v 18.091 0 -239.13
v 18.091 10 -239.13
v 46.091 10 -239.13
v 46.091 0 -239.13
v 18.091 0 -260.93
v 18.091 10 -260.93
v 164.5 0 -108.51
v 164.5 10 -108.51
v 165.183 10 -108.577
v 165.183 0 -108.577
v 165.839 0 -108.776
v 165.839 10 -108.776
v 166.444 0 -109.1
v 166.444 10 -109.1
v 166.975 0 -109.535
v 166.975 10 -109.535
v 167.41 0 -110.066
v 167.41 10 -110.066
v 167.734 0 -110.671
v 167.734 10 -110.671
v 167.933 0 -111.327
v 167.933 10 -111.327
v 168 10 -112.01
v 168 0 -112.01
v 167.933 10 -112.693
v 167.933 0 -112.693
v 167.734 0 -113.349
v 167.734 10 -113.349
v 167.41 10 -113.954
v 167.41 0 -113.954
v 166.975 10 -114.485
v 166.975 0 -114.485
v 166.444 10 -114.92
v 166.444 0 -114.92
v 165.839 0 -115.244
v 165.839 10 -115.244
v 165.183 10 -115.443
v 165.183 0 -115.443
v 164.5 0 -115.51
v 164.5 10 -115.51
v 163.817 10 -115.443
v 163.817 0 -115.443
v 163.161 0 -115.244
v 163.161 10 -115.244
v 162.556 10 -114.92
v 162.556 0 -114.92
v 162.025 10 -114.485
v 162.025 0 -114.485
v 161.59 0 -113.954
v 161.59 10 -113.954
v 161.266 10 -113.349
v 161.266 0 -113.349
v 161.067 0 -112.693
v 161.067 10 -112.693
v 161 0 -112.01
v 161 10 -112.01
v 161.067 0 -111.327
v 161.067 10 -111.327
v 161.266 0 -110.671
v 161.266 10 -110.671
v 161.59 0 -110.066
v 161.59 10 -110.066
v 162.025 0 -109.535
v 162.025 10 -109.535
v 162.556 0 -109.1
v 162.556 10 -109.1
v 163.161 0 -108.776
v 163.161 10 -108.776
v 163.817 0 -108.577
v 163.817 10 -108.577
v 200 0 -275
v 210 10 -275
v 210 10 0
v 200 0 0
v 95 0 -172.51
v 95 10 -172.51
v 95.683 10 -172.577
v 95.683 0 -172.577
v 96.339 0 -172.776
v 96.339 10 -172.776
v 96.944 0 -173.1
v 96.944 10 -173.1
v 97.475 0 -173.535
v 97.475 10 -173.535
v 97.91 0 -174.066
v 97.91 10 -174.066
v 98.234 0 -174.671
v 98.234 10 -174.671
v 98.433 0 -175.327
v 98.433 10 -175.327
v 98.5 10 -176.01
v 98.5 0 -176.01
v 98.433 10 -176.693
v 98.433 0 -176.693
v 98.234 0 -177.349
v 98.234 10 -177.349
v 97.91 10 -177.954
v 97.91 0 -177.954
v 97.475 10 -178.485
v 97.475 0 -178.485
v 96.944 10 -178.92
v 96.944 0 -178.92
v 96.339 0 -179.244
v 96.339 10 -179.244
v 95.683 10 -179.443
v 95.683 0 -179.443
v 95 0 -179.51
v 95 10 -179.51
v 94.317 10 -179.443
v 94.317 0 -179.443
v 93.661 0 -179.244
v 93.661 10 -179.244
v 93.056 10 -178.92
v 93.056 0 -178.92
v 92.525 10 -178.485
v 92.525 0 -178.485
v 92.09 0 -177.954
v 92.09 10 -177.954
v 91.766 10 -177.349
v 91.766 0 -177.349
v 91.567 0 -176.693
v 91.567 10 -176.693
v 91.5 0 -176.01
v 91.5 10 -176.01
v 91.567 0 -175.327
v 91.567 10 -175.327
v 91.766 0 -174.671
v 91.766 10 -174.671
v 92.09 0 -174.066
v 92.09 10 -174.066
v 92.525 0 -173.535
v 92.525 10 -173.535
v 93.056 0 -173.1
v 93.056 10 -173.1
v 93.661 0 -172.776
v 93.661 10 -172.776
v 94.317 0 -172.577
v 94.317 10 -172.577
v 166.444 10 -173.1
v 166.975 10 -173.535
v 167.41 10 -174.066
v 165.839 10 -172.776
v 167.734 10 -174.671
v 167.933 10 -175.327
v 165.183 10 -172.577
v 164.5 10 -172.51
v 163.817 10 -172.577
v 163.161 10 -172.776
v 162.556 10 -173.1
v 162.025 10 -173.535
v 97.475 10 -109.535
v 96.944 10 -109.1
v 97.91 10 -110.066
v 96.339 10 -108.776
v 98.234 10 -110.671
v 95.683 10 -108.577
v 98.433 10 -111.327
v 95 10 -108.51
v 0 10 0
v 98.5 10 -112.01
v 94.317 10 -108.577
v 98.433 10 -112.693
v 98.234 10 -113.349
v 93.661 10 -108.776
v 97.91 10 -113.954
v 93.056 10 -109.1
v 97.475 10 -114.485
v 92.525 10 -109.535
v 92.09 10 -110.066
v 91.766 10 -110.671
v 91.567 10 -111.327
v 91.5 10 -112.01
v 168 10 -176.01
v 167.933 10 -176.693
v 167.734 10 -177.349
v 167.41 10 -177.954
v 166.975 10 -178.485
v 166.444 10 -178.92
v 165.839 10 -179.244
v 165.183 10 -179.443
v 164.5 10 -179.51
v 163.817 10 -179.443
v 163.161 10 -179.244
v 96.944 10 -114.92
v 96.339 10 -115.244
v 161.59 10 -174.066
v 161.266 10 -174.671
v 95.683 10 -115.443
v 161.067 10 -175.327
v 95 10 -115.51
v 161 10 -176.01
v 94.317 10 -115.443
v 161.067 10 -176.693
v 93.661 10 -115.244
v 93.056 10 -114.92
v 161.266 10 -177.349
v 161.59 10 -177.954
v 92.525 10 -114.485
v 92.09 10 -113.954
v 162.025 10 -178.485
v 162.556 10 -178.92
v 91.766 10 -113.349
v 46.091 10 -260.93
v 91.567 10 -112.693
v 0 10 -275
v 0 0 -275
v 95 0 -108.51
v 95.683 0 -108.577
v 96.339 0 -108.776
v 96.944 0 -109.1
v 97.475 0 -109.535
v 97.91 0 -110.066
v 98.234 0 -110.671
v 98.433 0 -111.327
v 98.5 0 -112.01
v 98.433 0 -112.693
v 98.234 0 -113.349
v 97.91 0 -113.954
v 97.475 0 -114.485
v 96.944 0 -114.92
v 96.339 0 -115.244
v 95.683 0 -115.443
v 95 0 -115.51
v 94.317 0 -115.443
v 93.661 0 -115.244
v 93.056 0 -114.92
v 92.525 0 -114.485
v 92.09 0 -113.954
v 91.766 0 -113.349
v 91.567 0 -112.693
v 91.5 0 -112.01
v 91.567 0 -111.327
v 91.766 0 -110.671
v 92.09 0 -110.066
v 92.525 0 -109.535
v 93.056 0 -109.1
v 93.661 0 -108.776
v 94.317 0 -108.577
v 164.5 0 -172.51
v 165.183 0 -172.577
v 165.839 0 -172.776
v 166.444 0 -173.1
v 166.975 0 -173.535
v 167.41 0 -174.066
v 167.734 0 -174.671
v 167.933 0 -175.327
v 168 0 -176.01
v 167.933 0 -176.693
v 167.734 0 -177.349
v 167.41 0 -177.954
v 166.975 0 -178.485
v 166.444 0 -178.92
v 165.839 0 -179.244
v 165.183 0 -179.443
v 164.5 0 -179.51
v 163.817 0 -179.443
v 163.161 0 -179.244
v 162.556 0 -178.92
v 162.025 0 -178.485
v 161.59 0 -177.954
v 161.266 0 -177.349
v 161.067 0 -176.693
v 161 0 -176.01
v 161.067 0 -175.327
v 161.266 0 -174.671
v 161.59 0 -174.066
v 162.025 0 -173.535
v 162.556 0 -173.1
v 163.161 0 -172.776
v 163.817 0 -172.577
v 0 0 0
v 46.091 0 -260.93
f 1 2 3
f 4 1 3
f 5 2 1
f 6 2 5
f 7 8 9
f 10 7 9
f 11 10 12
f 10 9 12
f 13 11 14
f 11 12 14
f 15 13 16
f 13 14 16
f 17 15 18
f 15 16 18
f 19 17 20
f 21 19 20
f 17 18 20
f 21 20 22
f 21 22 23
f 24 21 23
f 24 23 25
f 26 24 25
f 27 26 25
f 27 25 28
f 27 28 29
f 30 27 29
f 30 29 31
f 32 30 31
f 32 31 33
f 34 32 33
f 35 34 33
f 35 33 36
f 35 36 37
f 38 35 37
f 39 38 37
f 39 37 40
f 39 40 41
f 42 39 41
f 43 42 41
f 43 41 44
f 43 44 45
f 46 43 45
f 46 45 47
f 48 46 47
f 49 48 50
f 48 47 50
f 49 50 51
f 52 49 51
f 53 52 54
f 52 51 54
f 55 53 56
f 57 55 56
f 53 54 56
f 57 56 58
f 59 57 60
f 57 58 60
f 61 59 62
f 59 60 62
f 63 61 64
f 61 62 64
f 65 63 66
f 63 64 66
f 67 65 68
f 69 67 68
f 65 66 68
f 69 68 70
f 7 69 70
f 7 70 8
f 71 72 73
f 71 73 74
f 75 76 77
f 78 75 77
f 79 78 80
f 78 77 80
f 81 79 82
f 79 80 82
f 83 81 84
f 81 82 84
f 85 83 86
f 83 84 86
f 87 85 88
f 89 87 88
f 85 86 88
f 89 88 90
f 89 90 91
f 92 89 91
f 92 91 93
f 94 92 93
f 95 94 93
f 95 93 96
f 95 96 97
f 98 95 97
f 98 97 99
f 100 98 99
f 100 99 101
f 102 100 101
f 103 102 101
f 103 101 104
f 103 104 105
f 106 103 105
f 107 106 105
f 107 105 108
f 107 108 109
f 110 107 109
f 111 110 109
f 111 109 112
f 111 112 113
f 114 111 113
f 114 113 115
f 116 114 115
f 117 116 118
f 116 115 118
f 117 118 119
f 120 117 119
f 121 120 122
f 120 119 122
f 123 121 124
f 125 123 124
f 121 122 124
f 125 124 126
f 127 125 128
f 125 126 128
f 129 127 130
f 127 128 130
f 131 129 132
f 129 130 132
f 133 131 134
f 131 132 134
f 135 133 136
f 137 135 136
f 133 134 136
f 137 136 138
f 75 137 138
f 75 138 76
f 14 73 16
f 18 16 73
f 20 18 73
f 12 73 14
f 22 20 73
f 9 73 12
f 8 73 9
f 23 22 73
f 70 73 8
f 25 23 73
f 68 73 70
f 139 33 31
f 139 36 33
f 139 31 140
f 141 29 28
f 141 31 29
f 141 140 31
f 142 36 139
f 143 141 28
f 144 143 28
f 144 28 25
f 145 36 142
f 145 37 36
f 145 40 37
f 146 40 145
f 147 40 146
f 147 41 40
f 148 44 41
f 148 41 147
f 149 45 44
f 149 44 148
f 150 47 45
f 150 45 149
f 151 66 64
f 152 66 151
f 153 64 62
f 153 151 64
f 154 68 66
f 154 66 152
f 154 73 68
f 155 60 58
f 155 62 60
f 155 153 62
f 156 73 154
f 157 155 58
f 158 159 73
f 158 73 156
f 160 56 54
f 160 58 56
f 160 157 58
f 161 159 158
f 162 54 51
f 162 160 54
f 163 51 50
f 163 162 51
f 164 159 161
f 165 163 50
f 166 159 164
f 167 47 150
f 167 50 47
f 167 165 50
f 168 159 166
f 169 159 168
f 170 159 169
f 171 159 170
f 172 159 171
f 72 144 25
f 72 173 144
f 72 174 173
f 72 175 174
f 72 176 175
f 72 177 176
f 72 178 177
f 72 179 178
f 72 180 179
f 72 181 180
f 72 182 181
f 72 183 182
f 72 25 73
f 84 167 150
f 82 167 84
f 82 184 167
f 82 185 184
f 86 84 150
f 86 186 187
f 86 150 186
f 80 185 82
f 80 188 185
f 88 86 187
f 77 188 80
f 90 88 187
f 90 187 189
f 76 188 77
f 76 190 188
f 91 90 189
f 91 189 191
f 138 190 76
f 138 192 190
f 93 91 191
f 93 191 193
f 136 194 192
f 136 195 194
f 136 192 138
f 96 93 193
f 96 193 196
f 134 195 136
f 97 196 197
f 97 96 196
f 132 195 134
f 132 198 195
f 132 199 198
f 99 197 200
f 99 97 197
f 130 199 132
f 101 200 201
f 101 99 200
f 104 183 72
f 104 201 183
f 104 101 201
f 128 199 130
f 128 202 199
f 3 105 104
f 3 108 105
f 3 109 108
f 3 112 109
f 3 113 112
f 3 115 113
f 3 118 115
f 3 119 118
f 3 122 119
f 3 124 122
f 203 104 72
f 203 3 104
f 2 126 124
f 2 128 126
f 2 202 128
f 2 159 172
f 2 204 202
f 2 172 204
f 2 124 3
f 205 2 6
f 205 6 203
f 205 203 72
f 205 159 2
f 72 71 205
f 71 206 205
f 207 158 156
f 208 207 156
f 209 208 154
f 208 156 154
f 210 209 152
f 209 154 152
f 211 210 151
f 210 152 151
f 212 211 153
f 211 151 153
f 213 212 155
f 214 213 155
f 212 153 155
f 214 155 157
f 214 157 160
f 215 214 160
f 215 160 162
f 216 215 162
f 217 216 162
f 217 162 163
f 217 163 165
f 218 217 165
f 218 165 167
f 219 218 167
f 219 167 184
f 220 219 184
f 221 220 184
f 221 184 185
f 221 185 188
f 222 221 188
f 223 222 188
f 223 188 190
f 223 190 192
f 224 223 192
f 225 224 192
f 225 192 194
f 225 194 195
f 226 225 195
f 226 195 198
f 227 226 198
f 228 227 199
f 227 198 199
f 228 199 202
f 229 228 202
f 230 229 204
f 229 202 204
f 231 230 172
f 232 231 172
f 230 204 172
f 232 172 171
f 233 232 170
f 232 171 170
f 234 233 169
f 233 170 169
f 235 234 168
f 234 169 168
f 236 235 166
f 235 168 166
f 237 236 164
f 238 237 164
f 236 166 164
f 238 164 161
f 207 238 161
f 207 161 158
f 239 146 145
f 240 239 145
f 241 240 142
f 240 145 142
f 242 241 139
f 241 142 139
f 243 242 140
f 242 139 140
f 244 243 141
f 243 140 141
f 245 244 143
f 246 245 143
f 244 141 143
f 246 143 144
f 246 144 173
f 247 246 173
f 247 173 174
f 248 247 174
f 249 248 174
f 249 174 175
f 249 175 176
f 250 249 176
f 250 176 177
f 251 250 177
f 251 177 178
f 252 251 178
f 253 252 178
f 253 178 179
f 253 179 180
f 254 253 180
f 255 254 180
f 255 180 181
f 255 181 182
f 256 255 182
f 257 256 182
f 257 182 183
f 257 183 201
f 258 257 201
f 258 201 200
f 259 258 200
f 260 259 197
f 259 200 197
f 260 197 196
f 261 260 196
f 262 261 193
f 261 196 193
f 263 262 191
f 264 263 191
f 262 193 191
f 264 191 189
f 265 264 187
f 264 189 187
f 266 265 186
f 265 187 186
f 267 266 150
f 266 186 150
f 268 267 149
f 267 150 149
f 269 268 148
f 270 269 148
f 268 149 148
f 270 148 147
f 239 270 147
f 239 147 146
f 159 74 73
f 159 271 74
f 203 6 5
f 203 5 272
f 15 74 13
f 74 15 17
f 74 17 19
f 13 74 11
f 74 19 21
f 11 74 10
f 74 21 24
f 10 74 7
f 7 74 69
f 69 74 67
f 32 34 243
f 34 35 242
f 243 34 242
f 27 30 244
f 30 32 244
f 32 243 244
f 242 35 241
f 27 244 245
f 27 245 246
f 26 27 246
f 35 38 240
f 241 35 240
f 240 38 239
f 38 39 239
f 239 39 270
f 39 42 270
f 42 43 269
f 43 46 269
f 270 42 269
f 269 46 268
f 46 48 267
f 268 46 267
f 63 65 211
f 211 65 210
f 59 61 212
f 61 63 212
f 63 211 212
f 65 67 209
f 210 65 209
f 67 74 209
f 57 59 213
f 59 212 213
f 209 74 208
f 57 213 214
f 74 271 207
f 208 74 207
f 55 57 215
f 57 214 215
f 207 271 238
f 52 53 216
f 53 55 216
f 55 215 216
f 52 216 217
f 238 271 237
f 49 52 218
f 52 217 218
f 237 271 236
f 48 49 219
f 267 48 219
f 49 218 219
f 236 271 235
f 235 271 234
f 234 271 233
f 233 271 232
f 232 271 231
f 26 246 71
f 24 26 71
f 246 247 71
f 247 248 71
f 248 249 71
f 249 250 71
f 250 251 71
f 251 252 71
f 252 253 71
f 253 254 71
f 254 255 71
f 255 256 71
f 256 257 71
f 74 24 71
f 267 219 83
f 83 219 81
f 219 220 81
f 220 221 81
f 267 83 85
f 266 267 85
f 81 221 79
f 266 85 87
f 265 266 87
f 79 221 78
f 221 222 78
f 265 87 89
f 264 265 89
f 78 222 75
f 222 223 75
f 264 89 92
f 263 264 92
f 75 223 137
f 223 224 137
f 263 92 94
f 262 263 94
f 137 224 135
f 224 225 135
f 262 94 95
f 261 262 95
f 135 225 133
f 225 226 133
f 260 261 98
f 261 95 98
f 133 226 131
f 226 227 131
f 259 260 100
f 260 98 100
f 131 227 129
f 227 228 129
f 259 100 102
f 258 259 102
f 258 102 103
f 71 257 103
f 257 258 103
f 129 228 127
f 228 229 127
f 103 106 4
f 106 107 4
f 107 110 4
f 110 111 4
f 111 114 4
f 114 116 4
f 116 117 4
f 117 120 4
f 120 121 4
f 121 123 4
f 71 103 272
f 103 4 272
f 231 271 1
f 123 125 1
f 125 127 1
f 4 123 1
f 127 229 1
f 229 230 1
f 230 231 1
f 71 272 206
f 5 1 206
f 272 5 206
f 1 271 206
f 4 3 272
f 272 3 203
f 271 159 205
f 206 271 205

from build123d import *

# Parameters (mm, degrees)
IZIM1_W                     = 275
IZIM1_H                     = 10
Y_KSEKLIK_EKSTR_ZYON1_DEPTH = 200
IZIM2_W                     = 275
IZIM2_H                     = 10
Y_KSEKLIK_EKSTR_ZYON2_DEPTH = 10
KES_EKSTR_ZYON1_DEPTH       = 347.157478613
CUT_EXTRUDE1_REACH          = 348.157
SKETCH1_R                   = 3.5
SKETCH2_W                   = 28
SKETCH2_H                   = 21.8
CUT_EXTRUDE2_DEPTH          = 10


with BuildPart() as part:
    # Çizim1 → Yükseklik-Ekstrüzyon1 (new body)
    with BuildSketch(Plane(origin=(0, 0, 0), x_dir=(0, 0, -1), z_dir=(1, 0, 0))):
        with Locations((137.5, 5)):
            Rectangle(IZIM1_W, IZIM1_H)
    extrude(amount=Y_KSEKLIK_EKSTR_ZYON1_DEPTH)

    # Çizim2 → Yükseklik-Ekstrüzyon2 (add)
    with BuildSketch(Plane(origin=(200, 0, 0), x_dir=(0, 0, -1), z_dir=(1, 0, 0))):
        with Locations((137.5, 5)):
            Rectangle(IZIM2_W, IZIM2_H)
    extrude(amount=Y_KSEKLIK_EKSTR_ZYON2_DEPTH)

    # Çizim3 → Kes-Ekstrüzyon1 (cut, through all)
    with BuildSketch(Plane(origin=(0, 0, -275), x_dir=(-1, 0, 0), z_dir=(0, 0, -1))):
        Polygon((-210, 10), (-200, 0), (-210, 0), align=None)
    extrude(amount=-KES_EKSTR_ZYON1_DEPTH, mode=Mode.SUBTRACT)

    # Sketch1 → Cut-Extrude1 (cut, up to next)
    with BuildSketch(Plane(origin=(0, 10, 0), x_dir=(1, 0, 0), z_dir=(0, 1, 0)), mode=Mode.PRIVATE) as cut_extrude1_sk1:
        with Locations(Location((95, 176.01, 0), (0, 0, 270))):
            Circle(SKETCH1_R)
    cut_extrude1_tool1 = extrude(cut_extrude1_sk1.sketch, amount=-CUT_EXTRUDE1_REACH, mode=Mode.PRIVATE) & part.part
    # Sketch1 → Cut-Extrude1 (cut, up to next)
    with BuildSketch(Plane(origin=(0, 10, 0), x_dir=(1, 0, 0), z_dir=(0, 1, 0)), mode=Mode.PRIVATE) as cut_extrude1_sk2:
        with Locations(Location((164.5, 176.01, 0), (0, 0, 270))):
            Circle(SKETCH1_R)
    cut_extrude1_tool2 = extrude(cut_extrude1_sk2.sketch, amount=-CUT_EXTRUDE1_REACH, mode=Mode.PRIVATE) & part.part
    # Sketch1 → Cut-Extrude1 (cut, up to next)
    with BuildSketch(Plane(origin=(0, 10, 0), x_dir=(1, 0, 0), z_dir=(0, 1, 0)), mode=Mode.PRIVATE) as cut_extrude1_sk3:
        with Locations(Location((95, 112.01, 0), (0, 0, 270))):
            Circle(SKETCH1_R)
    cut_extrude1_tool3 = extrude(cut_extrude1_sk3.sketch, amount=-CUT_EXTRUDE1_REACH, mode=Mode.PRIVATE) & part.part
    # Sketch1 → Cut-Extrude1 (cut, up to next)
    with BuildSketch(Plane(origin=(0, 10, 0), x_dir=(1, 0, 0), z_dir=(0, 1, 0)), mode=Mode.PRIVATE) as cut_extrude1_sk4:
        with Locations(Location((164.5, 112.01, 0), (0, 0, 270))):
            Circle(SKETCH1_R)
    cut_extrude1_tool4 = extrude(cut_extrude1_sk4.sketch, amount=-CUT_EXTRUDE1_REACH, mode=Mode.PRIVATE) & part.part
    add(cut_extrude1_tool1.solids().sort_by_distance((95, 10, -176.01))[0], mode=Mode.SUBTRACT)
    add(cut_extrude1_tool2.solids().sort_by_distance((164.5, 10, -176.01))[0], mode=Mode.SUBTRACT)
    add(cut_extrude1_tool3.solids().sort_by_distance((95, 10, -112.01))[0], mode=Mode.SUBTRACT)
    add(cut_extrude1_tool4.solids().sort_by_distance((164.5, 10, -112.01))[0], mode=Mode.SUBTRACT)

    # Sketch2 → Cut-Extrude2 (cut)
    with BuildSketch(Plane(origin=(0, 10, 0), x_dir=(1, 0, 0), z_dir=(0, 1, 0))):
        with Locations((32.090687836, 250.029608882)):
            Rectangle(SKETCH2_W, SKETCH2_H)
    extrude(amount=-CUT_EXTRUDE2_DEPTH, mode=Mode.SUBTRACT)


solid = part.part
